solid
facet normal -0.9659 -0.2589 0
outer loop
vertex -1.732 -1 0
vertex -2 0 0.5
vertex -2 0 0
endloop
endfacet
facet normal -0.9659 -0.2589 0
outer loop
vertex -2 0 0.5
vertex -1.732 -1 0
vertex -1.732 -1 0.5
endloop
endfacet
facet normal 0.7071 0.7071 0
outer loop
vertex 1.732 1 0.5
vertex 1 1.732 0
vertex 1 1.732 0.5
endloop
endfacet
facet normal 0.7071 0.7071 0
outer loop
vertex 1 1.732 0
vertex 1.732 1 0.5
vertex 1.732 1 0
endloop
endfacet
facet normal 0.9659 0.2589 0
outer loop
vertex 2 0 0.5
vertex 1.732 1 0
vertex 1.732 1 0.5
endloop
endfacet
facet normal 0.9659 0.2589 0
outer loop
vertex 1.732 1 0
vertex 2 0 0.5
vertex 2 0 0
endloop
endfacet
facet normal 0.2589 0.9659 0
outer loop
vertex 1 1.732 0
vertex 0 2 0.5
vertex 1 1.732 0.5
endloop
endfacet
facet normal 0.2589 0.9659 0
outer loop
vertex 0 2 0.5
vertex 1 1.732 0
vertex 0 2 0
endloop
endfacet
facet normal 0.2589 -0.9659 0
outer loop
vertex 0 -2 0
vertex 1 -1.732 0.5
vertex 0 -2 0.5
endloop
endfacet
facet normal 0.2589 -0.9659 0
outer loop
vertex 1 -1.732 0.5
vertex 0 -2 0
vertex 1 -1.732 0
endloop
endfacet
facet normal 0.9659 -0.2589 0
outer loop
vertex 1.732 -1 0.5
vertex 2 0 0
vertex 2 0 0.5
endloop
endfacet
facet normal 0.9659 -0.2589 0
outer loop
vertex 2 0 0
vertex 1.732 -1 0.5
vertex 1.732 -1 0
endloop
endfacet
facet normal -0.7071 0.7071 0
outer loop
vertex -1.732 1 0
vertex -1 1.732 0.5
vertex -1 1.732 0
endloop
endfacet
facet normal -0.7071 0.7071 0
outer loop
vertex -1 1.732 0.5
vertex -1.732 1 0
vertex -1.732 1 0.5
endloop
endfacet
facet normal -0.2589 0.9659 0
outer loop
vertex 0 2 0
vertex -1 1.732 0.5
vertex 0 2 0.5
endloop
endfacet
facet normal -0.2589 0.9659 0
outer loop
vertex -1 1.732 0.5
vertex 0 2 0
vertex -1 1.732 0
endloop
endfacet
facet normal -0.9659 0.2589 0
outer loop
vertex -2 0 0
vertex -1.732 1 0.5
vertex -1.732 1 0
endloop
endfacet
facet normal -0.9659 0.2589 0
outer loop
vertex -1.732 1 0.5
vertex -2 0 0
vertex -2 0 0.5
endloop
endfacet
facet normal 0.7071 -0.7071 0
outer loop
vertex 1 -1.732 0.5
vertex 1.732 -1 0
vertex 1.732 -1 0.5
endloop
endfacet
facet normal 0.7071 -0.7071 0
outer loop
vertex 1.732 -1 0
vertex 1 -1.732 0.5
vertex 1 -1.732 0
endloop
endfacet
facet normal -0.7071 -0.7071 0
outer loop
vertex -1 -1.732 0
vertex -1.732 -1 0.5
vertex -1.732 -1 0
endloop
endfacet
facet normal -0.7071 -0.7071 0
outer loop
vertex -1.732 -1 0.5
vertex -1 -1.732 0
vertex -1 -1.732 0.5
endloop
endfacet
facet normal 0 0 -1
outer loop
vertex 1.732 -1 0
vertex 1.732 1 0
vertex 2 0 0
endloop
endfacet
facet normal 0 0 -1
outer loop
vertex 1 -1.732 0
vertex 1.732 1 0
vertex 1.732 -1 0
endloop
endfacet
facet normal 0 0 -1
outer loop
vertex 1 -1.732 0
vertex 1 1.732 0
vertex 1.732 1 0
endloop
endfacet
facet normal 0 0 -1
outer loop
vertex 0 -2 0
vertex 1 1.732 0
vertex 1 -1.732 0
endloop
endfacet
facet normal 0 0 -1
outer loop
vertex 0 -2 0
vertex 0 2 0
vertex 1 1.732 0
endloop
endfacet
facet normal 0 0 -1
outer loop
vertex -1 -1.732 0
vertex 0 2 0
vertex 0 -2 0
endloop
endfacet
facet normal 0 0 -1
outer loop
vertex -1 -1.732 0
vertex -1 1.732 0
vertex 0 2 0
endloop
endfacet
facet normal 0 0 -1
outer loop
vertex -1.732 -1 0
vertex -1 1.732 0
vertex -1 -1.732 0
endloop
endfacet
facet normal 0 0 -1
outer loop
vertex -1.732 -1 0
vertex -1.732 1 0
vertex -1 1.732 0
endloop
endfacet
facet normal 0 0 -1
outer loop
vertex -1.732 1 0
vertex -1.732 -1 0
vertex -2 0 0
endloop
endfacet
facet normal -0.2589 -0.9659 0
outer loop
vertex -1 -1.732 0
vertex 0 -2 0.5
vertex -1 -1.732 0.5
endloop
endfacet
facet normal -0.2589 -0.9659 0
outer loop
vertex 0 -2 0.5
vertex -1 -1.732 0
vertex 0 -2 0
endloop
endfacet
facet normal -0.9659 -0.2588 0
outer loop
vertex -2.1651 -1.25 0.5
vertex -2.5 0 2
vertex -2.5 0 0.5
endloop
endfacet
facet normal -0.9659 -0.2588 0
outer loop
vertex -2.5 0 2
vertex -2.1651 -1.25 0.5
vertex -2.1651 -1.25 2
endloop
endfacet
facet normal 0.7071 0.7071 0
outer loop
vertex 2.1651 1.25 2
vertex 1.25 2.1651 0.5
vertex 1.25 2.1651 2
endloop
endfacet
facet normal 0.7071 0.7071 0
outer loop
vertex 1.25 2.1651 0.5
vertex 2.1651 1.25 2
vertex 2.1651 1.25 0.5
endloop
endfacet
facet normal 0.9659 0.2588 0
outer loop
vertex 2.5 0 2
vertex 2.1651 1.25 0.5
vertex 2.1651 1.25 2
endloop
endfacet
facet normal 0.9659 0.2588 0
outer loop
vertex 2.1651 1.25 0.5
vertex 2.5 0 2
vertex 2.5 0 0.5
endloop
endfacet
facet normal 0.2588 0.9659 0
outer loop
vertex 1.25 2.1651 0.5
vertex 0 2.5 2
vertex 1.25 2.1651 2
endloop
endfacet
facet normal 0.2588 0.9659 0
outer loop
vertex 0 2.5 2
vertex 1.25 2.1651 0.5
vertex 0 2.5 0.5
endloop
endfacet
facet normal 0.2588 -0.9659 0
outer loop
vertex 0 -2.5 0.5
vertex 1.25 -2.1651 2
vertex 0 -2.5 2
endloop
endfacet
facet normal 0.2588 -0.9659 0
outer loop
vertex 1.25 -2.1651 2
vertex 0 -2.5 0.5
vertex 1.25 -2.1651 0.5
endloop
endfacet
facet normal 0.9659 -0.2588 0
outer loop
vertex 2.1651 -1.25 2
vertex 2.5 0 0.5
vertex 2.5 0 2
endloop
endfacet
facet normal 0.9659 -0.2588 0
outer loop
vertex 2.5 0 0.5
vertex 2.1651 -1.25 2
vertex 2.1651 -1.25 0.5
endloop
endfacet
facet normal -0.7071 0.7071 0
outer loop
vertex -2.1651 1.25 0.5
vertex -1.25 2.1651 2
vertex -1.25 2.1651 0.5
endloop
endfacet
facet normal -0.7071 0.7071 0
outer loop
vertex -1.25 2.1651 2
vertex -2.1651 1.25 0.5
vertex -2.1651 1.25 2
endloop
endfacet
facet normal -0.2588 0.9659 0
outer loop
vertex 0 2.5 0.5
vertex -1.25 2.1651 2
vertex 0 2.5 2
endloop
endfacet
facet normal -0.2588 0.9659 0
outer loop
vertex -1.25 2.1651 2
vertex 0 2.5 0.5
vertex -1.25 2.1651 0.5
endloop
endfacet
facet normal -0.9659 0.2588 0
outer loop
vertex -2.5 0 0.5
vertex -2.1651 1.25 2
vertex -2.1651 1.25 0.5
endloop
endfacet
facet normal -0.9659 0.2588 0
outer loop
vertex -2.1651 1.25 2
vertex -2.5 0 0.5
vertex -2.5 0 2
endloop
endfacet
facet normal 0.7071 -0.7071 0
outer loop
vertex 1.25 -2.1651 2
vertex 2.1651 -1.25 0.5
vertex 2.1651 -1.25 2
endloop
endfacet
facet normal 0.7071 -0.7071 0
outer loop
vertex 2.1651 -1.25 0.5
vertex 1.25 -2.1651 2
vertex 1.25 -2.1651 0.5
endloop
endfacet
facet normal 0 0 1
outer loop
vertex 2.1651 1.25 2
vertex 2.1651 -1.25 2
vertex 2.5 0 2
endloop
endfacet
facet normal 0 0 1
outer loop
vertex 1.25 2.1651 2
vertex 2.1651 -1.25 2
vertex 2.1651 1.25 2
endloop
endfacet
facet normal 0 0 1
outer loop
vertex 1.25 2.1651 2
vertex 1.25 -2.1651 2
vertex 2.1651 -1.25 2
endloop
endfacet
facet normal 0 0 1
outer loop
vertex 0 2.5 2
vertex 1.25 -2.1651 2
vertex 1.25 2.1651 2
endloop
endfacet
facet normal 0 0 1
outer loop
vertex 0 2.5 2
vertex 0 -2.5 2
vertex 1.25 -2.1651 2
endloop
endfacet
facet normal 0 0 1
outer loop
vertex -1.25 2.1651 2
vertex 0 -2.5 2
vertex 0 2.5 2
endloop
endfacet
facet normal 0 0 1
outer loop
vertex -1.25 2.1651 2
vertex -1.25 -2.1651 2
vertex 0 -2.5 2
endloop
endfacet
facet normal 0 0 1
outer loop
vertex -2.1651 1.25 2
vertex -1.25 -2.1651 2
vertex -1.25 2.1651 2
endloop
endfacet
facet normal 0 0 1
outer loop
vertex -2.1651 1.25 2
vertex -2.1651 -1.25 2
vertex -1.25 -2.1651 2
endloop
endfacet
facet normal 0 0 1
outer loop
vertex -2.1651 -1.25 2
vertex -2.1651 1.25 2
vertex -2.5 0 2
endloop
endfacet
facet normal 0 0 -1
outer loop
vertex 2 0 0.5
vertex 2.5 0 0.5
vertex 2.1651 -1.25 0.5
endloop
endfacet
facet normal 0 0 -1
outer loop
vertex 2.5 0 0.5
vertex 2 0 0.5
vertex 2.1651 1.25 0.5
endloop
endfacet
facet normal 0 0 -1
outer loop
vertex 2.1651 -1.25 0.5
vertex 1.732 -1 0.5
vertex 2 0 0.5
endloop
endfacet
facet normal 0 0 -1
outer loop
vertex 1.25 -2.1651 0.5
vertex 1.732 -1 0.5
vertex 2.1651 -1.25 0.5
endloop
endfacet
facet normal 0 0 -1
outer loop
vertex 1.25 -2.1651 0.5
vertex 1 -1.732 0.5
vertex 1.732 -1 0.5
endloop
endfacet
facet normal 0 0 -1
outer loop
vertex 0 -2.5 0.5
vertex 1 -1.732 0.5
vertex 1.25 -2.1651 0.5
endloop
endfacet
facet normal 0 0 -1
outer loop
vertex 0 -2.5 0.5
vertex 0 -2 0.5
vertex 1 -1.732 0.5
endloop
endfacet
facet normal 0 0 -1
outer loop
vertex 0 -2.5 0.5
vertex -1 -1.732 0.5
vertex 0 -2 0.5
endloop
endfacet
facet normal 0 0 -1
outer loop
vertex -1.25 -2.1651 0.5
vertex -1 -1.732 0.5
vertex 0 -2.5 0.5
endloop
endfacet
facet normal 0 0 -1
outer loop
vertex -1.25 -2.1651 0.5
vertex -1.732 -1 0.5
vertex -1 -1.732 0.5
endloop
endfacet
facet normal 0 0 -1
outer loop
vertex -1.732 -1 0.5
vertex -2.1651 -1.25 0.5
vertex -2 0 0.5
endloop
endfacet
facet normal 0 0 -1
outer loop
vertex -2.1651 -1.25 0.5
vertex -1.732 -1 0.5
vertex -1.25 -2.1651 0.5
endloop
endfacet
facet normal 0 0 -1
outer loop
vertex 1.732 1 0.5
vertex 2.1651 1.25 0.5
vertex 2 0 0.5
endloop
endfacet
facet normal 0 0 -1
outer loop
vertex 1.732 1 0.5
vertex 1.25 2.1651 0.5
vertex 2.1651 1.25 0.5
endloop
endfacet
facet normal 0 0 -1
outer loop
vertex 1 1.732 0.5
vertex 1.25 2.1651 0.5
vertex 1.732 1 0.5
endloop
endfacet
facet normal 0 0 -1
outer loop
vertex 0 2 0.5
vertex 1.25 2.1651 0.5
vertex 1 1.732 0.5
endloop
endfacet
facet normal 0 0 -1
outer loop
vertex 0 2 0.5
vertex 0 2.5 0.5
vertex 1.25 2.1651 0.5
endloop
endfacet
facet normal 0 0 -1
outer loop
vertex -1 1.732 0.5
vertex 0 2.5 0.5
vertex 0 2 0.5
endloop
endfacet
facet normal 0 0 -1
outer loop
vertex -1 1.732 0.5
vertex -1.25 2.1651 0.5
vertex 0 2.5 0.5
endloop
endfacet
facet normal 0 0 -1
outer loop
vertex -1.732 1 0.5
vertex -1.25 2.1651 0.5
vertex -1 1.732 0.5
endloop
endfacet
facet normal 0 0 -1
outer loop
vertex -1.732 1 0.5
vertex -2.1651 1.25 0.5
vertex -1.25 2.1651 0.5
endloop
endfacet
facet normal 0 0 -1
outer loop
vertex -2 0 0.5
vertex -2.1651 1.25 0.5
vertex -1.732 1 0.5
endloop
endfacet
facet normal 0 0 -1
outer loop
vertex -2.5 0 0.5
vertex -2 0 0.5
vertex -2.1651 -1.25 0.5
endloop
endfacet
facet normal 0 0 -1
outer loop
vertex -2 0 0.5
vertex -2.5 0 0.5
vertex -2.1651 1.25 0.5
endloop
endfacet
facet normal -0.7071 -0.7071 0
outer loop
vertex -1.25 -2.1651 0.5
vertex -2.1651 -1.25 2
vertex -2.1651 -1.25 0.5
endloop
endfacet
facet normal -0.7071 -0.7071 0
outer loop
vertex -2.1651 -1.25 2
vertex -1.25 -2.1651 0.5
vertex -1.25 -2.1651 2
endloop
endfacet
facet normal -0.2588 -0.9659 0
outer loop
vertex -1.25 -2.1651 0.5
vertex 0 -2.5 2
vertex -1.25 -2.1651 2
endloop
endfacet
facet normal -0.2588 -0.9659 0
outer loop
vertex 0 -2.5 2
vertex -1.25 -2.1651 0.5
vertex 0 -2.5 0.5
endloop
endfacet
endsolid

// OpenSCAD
// plate round 1x1 tile

// external vars #########################

ext_scale = 1.0;
ext_fn = 12;

// part ##################################

module plate_round_1x1_tile(m_scale=ext_scale,m_fn=ext_fn) {
    scale([m_scale,m_scale,m_scale])
    union() {
        cylinder(h=1,d=4,center=false,$fn=m_fn);
        translate([0,0,0.5])
        cylinder(h=1.5,d=5,center=false,$fn=m_fn);
    }
}

plate_round_1x1_tile();
